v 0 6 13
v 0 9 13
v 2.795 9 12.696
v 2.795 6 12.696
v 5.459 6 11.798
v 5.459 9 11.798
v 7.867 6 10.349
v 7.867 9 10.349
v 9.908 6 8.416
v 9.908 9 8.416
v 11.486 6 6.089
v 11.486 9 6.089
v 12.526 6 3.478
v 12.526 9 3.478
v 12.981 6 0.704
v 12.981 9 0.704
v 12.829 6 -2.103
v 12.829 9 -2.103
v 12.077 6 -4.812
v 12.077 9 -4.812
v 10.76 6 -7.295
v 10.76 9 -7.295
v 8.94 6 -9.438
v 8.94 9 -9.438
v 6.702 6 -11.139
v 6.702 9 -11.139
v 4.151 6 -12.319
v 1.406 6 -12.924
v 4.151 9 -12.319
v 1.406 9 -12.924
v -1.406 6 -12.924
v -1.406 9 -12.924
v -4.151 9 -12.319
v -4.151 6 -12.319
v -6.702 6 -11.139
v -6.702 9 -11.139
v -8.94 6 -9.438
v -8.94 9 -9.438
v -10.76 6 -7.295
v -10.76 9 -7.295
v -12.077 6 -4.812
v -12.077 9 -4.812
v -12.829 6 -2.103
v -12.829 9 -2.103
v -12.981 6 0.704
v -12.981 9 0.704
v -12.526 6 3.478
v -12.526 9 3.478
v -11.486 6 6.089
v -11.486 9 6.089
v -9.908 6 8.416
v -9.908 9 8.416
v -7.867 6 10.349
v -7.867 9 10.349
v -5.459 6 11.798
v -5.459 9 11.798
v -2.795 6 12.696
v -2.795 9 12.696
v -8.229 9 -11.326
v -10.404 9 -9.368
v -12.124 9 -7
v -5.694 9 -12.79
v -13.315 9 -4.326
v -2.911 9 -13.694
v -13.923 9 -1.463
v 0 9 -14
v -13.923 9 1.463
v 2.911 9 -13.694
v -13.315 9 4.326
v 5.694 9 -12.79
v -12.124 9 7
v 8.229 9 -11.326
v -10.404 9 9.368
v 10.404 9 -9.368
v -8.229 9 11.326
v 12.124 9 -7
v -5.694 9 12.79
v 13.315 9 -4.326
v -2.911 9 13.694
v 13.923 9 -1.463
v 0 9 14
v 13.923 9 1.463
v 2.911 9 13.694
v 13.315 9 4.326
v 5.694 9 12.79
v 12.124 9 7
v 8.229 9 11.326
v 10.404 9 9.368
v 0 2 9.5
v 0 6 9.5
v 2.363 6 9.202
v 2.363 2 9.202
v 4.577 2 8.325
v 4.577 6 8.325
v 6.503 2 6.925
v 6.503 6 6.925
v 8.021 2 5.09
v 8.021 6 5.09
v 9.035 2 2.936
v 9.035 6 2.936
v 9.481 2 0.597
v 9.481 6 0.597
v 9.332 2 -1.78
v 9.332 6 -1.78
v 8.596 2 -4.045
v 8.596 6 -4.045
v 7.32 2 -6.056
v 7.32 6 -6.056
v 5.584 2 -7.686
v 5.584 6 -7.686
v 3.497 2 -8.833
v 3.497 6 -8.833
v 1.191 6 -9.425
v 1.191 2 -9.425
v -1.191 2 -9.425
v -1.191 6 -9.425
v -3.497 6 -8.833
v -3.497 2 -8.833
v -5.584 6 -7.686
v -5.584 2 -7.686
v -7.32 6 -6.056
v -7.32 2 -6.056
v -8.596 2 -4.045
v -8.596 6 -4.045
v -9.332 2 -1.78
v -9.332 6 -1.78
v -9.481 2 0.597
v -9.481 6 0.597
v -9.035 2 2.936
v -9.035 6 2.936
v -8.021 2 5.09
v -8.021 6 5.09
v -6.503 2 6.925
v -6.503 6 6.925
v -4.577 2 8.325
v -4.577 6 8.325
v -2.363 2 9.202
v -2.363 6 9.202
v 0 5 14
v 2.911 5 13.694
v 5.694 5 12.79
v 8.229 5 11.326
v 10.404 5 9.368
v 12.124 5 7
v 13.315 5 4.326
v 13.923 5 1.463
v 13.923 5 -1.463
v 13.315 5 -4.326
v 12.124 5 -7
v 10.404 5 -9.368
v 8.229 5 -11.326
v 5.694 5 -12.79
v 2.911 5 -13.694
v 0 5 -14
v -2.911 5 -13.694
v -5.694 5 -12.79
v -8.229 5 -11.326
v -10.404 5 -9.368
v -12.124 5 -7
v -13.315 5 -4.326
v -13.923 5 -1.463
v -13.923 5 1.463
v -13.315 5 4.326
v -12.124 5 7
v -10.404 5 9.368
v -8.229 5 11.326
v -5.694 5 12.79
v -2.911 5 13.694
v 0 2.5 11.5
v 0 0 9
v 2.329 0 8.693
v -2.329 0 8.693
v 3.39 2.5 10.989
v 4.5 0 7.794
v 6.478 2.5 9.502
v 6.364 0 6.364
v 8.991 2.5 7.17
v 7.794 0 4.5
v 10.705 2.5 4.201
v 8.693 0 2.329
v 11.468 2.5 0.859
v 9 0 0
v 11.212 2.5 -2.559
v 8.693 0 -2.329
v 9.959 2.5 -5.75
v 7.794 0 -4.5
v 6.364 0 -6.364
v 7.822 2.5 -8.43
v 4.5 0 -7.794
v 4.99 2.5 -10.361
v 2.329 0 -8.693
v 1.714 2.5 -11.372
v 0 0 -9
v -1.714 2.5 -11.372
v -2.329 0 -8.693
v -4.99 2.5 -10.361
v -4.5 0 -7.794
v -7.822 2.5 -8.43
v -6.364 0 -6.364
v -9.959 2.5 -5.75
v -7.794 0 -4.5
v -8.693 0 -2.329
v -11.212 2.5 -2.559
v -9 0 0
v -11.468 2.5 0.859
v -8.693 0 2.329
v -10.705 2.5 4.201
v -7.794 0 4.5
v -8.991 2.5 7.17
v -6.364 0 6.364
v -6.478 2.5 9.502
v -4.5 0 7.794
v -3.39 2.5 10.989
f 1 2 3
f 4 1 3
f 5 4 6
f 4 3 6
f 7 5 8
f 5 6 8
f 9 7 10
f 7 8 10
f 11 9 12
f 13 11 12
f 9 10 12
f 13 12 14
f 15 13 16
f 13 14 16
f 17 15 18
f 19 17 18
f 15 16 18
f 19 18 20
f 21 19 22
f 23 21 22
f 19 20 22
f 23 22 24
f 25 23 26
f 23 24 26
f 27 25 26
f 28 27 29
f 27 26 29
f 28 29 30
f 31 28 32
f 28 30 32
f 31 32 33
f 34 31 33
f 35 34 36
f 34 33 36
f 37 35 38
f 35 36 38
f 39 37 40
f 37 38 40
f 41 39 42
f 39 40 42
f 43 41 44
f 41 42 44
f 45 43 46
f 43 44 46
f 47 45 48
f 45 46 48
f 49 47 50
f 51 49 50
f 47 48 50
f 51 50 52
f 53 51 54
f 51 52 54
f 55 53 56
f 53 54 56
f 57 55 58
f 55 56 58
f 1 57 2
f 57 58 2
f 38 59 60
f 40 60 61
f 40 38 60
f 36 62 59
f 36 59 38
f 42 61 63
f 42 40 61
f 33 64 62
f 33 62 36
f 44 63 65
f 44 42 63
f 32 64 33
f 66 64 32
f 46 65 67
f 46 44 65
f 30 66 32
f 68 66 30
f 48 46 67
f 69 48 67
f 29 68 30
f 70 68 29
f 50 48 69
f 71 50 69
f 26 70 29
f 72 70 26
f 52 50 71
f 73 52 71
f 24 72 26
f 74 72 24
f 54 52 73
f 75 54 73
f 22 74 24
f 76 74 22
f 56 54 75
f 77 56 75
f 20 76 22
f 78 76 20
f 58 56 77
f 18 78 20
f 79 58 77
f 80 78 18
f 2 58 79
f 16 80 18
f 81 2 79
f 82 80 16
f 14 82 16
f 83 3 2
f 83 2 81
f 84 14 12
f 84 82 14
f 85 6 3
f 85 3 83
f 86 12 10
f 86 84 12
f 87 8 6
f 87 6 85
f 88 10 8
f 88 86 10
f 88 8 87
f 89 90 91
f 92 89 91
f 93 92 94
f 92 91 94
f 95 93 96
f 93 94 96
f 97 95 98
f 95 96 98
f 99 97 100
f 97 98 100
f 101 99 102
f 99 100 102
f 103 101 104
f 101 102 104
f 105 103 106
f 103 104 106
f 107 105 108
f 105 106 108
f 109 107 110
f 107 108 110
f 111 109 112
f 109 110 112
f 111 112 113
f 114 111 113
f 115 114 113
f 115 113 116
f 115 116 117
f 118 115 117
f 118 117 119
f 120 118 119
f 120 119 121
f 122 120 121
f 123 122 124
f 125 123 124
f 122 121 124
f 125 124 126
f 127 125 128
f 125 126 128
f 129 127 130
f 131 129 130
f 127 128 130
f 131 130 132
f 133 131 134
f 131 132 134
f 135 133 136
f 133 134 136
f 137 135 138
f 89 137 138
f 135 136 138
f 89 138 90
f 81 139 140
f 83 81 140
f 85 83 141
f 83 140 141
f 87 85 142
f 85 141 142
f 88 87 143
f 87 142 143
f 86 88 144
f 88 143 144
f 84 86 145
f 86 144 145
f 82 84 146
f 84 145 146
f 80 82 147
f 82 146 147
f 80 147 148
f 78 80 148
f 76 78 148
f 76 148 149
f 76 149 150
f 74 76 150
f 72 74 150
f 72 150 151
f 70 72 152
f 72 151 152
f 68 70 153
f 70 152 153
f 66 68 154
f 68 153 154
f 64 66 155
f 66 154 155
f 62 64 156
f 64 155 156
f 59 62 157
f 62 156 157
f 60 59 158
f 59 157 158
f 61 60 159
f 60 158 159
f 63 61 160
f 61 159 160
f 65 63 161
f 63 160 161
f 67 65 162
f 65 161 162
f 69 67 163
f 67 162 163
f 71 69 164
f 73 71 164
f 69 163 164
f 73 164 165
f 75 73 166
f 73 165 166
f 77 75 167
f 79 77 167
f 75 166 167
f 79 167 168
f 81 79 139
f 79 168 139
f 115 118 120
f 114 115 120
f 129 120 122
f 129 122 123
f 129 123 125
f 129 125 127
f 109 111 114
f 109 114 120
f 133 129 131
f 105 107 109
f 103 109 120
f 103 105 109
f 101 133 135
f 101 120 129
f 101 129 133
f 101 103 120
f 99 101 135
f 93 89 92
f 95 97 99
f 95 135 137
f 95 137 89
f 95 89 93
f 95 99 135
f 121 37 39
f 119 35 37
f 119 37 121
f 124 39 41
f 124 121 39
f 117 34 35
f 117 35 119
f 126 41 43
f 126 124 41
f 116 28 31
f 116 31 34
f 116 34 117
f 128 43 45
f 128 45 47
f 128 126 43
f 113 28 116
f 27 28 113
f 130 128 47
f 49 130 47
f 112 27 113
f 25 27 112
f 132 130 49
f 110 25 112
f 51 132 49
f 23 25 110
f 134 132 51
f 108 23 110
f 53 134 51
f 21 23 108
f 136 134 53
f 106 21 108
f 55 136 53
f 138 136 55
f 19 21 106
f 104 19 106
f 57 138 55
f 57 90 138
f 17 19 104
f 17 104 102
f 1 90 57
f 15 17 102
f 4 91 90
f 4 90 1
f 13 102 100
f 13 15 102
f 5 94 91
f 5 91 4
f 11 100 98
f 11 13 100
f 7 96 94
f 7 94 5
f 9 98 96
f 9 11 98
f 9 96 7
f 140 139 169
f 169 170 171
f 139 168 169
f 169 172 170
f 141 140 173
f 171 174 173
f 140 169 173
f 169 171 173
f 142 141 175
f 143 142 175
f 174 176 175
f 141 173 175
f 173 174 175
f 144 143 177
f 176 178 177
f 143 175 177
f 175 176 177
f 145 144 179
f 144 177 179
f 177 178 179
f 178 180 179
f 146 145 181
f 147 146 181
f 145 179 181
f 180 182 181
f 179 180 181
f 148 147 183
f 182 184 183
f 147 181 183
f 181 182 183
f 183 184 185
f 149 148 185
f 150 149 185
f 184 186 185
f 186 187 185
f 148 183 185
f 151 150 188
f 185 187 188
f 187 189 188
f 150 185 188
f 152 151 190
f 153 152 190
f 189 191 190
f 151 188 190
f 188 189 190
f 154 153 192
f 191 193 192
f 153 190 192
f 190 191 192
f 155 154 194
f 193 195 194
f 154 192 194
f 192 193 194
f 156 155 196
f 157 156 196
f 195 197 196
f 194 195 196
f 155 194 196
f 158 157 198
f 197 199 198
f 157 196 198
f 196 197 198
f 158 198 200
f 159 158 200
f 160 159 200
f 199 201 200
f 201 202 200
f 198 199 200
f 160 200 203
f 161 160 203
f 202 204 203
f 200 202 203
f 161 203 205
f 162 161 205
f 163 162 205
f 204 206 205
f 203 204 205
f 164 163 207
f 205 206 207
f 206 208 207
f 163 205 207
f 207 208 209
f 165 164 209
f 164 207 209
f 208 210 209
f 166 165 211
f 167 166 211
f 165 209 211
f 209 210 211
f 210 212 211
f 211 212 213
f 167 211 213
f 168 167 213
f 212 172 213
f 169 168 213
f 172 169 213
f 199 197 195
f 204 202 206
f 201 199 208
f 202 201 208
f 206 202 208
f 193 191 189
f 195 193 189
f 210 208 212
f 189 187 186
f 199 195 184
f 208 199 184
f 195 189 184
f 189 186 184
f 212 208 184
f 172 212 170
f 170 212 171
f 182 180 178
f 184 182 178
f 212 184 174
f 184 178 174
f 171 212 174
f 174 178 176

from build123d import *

# Parameters (mm, degrees)
ESQUISSE1_R             = 14
BOSS_EXTRU_1_DEPTH      = 9
ESQUISSE2_R             = 13
ENL_V_MAT_EXTRU_1_DEPTH = 3
ESQUISSE4_R             = 9.5
ENL_V_MAT_EXTRU_2_DEPTH = 4
CHANFREIN1_SIZE         = 5


with BuildPart() as part:
    # Esquisse1 → Boss.-Extru.1 (new body)
    with BuildSketch(Plane(origin=(0, 0, 0), x_dir=(1, 0, 0), z_dir=(0, 1, 0))):
        with Locations(Location((0, 0, 0), (0, 0, 270))):
            Circle(ESQUISSE1_R)
    extrude(amount=BOSS_EXTRU_1_DEPTH)

    # Esquisse2 → Enlèv. mat.-Extru.1 (cut)
    with BuildSketch(Plane(origin=(0, 9, 0), x_dir=(1, 0, 0), z_dir=(0, 1, 0))):
        with Locations(Location((0, 0, 0), (0, 0, 270))):
            Circle(ESQUISSE2_R)
    extrude(amount=-ENL_V_MAT_EXTRU_1_DEPTH, mode=Mode.SUBTRACT)

    # Esquisse4 → Enlèv. mat.-Extru.2 (cut)
    with BuildSketch(Plane(origin=(0, 6, 0), x_dir=(1, 0, 0), z_dir=(0, 1, 0))):
        with Locations(Location((0, 0, 0), (0, 0, 270))):
            Circle(ESQUISSE4_R)
    extrude(amount=-ENL_V_MAT_EXTRU_2_DEPTH, mode=Mode.SUBTRACT)

    # Chanfrein1
    chanfrein1_edges = [part.edges().sort_by_distance(p)[0] for p in [
        (0, 0, -14),
    ]]
    chamfer(chanfrein1_edges, length=CHANFREIN1_SIZE)


solid = part.part
